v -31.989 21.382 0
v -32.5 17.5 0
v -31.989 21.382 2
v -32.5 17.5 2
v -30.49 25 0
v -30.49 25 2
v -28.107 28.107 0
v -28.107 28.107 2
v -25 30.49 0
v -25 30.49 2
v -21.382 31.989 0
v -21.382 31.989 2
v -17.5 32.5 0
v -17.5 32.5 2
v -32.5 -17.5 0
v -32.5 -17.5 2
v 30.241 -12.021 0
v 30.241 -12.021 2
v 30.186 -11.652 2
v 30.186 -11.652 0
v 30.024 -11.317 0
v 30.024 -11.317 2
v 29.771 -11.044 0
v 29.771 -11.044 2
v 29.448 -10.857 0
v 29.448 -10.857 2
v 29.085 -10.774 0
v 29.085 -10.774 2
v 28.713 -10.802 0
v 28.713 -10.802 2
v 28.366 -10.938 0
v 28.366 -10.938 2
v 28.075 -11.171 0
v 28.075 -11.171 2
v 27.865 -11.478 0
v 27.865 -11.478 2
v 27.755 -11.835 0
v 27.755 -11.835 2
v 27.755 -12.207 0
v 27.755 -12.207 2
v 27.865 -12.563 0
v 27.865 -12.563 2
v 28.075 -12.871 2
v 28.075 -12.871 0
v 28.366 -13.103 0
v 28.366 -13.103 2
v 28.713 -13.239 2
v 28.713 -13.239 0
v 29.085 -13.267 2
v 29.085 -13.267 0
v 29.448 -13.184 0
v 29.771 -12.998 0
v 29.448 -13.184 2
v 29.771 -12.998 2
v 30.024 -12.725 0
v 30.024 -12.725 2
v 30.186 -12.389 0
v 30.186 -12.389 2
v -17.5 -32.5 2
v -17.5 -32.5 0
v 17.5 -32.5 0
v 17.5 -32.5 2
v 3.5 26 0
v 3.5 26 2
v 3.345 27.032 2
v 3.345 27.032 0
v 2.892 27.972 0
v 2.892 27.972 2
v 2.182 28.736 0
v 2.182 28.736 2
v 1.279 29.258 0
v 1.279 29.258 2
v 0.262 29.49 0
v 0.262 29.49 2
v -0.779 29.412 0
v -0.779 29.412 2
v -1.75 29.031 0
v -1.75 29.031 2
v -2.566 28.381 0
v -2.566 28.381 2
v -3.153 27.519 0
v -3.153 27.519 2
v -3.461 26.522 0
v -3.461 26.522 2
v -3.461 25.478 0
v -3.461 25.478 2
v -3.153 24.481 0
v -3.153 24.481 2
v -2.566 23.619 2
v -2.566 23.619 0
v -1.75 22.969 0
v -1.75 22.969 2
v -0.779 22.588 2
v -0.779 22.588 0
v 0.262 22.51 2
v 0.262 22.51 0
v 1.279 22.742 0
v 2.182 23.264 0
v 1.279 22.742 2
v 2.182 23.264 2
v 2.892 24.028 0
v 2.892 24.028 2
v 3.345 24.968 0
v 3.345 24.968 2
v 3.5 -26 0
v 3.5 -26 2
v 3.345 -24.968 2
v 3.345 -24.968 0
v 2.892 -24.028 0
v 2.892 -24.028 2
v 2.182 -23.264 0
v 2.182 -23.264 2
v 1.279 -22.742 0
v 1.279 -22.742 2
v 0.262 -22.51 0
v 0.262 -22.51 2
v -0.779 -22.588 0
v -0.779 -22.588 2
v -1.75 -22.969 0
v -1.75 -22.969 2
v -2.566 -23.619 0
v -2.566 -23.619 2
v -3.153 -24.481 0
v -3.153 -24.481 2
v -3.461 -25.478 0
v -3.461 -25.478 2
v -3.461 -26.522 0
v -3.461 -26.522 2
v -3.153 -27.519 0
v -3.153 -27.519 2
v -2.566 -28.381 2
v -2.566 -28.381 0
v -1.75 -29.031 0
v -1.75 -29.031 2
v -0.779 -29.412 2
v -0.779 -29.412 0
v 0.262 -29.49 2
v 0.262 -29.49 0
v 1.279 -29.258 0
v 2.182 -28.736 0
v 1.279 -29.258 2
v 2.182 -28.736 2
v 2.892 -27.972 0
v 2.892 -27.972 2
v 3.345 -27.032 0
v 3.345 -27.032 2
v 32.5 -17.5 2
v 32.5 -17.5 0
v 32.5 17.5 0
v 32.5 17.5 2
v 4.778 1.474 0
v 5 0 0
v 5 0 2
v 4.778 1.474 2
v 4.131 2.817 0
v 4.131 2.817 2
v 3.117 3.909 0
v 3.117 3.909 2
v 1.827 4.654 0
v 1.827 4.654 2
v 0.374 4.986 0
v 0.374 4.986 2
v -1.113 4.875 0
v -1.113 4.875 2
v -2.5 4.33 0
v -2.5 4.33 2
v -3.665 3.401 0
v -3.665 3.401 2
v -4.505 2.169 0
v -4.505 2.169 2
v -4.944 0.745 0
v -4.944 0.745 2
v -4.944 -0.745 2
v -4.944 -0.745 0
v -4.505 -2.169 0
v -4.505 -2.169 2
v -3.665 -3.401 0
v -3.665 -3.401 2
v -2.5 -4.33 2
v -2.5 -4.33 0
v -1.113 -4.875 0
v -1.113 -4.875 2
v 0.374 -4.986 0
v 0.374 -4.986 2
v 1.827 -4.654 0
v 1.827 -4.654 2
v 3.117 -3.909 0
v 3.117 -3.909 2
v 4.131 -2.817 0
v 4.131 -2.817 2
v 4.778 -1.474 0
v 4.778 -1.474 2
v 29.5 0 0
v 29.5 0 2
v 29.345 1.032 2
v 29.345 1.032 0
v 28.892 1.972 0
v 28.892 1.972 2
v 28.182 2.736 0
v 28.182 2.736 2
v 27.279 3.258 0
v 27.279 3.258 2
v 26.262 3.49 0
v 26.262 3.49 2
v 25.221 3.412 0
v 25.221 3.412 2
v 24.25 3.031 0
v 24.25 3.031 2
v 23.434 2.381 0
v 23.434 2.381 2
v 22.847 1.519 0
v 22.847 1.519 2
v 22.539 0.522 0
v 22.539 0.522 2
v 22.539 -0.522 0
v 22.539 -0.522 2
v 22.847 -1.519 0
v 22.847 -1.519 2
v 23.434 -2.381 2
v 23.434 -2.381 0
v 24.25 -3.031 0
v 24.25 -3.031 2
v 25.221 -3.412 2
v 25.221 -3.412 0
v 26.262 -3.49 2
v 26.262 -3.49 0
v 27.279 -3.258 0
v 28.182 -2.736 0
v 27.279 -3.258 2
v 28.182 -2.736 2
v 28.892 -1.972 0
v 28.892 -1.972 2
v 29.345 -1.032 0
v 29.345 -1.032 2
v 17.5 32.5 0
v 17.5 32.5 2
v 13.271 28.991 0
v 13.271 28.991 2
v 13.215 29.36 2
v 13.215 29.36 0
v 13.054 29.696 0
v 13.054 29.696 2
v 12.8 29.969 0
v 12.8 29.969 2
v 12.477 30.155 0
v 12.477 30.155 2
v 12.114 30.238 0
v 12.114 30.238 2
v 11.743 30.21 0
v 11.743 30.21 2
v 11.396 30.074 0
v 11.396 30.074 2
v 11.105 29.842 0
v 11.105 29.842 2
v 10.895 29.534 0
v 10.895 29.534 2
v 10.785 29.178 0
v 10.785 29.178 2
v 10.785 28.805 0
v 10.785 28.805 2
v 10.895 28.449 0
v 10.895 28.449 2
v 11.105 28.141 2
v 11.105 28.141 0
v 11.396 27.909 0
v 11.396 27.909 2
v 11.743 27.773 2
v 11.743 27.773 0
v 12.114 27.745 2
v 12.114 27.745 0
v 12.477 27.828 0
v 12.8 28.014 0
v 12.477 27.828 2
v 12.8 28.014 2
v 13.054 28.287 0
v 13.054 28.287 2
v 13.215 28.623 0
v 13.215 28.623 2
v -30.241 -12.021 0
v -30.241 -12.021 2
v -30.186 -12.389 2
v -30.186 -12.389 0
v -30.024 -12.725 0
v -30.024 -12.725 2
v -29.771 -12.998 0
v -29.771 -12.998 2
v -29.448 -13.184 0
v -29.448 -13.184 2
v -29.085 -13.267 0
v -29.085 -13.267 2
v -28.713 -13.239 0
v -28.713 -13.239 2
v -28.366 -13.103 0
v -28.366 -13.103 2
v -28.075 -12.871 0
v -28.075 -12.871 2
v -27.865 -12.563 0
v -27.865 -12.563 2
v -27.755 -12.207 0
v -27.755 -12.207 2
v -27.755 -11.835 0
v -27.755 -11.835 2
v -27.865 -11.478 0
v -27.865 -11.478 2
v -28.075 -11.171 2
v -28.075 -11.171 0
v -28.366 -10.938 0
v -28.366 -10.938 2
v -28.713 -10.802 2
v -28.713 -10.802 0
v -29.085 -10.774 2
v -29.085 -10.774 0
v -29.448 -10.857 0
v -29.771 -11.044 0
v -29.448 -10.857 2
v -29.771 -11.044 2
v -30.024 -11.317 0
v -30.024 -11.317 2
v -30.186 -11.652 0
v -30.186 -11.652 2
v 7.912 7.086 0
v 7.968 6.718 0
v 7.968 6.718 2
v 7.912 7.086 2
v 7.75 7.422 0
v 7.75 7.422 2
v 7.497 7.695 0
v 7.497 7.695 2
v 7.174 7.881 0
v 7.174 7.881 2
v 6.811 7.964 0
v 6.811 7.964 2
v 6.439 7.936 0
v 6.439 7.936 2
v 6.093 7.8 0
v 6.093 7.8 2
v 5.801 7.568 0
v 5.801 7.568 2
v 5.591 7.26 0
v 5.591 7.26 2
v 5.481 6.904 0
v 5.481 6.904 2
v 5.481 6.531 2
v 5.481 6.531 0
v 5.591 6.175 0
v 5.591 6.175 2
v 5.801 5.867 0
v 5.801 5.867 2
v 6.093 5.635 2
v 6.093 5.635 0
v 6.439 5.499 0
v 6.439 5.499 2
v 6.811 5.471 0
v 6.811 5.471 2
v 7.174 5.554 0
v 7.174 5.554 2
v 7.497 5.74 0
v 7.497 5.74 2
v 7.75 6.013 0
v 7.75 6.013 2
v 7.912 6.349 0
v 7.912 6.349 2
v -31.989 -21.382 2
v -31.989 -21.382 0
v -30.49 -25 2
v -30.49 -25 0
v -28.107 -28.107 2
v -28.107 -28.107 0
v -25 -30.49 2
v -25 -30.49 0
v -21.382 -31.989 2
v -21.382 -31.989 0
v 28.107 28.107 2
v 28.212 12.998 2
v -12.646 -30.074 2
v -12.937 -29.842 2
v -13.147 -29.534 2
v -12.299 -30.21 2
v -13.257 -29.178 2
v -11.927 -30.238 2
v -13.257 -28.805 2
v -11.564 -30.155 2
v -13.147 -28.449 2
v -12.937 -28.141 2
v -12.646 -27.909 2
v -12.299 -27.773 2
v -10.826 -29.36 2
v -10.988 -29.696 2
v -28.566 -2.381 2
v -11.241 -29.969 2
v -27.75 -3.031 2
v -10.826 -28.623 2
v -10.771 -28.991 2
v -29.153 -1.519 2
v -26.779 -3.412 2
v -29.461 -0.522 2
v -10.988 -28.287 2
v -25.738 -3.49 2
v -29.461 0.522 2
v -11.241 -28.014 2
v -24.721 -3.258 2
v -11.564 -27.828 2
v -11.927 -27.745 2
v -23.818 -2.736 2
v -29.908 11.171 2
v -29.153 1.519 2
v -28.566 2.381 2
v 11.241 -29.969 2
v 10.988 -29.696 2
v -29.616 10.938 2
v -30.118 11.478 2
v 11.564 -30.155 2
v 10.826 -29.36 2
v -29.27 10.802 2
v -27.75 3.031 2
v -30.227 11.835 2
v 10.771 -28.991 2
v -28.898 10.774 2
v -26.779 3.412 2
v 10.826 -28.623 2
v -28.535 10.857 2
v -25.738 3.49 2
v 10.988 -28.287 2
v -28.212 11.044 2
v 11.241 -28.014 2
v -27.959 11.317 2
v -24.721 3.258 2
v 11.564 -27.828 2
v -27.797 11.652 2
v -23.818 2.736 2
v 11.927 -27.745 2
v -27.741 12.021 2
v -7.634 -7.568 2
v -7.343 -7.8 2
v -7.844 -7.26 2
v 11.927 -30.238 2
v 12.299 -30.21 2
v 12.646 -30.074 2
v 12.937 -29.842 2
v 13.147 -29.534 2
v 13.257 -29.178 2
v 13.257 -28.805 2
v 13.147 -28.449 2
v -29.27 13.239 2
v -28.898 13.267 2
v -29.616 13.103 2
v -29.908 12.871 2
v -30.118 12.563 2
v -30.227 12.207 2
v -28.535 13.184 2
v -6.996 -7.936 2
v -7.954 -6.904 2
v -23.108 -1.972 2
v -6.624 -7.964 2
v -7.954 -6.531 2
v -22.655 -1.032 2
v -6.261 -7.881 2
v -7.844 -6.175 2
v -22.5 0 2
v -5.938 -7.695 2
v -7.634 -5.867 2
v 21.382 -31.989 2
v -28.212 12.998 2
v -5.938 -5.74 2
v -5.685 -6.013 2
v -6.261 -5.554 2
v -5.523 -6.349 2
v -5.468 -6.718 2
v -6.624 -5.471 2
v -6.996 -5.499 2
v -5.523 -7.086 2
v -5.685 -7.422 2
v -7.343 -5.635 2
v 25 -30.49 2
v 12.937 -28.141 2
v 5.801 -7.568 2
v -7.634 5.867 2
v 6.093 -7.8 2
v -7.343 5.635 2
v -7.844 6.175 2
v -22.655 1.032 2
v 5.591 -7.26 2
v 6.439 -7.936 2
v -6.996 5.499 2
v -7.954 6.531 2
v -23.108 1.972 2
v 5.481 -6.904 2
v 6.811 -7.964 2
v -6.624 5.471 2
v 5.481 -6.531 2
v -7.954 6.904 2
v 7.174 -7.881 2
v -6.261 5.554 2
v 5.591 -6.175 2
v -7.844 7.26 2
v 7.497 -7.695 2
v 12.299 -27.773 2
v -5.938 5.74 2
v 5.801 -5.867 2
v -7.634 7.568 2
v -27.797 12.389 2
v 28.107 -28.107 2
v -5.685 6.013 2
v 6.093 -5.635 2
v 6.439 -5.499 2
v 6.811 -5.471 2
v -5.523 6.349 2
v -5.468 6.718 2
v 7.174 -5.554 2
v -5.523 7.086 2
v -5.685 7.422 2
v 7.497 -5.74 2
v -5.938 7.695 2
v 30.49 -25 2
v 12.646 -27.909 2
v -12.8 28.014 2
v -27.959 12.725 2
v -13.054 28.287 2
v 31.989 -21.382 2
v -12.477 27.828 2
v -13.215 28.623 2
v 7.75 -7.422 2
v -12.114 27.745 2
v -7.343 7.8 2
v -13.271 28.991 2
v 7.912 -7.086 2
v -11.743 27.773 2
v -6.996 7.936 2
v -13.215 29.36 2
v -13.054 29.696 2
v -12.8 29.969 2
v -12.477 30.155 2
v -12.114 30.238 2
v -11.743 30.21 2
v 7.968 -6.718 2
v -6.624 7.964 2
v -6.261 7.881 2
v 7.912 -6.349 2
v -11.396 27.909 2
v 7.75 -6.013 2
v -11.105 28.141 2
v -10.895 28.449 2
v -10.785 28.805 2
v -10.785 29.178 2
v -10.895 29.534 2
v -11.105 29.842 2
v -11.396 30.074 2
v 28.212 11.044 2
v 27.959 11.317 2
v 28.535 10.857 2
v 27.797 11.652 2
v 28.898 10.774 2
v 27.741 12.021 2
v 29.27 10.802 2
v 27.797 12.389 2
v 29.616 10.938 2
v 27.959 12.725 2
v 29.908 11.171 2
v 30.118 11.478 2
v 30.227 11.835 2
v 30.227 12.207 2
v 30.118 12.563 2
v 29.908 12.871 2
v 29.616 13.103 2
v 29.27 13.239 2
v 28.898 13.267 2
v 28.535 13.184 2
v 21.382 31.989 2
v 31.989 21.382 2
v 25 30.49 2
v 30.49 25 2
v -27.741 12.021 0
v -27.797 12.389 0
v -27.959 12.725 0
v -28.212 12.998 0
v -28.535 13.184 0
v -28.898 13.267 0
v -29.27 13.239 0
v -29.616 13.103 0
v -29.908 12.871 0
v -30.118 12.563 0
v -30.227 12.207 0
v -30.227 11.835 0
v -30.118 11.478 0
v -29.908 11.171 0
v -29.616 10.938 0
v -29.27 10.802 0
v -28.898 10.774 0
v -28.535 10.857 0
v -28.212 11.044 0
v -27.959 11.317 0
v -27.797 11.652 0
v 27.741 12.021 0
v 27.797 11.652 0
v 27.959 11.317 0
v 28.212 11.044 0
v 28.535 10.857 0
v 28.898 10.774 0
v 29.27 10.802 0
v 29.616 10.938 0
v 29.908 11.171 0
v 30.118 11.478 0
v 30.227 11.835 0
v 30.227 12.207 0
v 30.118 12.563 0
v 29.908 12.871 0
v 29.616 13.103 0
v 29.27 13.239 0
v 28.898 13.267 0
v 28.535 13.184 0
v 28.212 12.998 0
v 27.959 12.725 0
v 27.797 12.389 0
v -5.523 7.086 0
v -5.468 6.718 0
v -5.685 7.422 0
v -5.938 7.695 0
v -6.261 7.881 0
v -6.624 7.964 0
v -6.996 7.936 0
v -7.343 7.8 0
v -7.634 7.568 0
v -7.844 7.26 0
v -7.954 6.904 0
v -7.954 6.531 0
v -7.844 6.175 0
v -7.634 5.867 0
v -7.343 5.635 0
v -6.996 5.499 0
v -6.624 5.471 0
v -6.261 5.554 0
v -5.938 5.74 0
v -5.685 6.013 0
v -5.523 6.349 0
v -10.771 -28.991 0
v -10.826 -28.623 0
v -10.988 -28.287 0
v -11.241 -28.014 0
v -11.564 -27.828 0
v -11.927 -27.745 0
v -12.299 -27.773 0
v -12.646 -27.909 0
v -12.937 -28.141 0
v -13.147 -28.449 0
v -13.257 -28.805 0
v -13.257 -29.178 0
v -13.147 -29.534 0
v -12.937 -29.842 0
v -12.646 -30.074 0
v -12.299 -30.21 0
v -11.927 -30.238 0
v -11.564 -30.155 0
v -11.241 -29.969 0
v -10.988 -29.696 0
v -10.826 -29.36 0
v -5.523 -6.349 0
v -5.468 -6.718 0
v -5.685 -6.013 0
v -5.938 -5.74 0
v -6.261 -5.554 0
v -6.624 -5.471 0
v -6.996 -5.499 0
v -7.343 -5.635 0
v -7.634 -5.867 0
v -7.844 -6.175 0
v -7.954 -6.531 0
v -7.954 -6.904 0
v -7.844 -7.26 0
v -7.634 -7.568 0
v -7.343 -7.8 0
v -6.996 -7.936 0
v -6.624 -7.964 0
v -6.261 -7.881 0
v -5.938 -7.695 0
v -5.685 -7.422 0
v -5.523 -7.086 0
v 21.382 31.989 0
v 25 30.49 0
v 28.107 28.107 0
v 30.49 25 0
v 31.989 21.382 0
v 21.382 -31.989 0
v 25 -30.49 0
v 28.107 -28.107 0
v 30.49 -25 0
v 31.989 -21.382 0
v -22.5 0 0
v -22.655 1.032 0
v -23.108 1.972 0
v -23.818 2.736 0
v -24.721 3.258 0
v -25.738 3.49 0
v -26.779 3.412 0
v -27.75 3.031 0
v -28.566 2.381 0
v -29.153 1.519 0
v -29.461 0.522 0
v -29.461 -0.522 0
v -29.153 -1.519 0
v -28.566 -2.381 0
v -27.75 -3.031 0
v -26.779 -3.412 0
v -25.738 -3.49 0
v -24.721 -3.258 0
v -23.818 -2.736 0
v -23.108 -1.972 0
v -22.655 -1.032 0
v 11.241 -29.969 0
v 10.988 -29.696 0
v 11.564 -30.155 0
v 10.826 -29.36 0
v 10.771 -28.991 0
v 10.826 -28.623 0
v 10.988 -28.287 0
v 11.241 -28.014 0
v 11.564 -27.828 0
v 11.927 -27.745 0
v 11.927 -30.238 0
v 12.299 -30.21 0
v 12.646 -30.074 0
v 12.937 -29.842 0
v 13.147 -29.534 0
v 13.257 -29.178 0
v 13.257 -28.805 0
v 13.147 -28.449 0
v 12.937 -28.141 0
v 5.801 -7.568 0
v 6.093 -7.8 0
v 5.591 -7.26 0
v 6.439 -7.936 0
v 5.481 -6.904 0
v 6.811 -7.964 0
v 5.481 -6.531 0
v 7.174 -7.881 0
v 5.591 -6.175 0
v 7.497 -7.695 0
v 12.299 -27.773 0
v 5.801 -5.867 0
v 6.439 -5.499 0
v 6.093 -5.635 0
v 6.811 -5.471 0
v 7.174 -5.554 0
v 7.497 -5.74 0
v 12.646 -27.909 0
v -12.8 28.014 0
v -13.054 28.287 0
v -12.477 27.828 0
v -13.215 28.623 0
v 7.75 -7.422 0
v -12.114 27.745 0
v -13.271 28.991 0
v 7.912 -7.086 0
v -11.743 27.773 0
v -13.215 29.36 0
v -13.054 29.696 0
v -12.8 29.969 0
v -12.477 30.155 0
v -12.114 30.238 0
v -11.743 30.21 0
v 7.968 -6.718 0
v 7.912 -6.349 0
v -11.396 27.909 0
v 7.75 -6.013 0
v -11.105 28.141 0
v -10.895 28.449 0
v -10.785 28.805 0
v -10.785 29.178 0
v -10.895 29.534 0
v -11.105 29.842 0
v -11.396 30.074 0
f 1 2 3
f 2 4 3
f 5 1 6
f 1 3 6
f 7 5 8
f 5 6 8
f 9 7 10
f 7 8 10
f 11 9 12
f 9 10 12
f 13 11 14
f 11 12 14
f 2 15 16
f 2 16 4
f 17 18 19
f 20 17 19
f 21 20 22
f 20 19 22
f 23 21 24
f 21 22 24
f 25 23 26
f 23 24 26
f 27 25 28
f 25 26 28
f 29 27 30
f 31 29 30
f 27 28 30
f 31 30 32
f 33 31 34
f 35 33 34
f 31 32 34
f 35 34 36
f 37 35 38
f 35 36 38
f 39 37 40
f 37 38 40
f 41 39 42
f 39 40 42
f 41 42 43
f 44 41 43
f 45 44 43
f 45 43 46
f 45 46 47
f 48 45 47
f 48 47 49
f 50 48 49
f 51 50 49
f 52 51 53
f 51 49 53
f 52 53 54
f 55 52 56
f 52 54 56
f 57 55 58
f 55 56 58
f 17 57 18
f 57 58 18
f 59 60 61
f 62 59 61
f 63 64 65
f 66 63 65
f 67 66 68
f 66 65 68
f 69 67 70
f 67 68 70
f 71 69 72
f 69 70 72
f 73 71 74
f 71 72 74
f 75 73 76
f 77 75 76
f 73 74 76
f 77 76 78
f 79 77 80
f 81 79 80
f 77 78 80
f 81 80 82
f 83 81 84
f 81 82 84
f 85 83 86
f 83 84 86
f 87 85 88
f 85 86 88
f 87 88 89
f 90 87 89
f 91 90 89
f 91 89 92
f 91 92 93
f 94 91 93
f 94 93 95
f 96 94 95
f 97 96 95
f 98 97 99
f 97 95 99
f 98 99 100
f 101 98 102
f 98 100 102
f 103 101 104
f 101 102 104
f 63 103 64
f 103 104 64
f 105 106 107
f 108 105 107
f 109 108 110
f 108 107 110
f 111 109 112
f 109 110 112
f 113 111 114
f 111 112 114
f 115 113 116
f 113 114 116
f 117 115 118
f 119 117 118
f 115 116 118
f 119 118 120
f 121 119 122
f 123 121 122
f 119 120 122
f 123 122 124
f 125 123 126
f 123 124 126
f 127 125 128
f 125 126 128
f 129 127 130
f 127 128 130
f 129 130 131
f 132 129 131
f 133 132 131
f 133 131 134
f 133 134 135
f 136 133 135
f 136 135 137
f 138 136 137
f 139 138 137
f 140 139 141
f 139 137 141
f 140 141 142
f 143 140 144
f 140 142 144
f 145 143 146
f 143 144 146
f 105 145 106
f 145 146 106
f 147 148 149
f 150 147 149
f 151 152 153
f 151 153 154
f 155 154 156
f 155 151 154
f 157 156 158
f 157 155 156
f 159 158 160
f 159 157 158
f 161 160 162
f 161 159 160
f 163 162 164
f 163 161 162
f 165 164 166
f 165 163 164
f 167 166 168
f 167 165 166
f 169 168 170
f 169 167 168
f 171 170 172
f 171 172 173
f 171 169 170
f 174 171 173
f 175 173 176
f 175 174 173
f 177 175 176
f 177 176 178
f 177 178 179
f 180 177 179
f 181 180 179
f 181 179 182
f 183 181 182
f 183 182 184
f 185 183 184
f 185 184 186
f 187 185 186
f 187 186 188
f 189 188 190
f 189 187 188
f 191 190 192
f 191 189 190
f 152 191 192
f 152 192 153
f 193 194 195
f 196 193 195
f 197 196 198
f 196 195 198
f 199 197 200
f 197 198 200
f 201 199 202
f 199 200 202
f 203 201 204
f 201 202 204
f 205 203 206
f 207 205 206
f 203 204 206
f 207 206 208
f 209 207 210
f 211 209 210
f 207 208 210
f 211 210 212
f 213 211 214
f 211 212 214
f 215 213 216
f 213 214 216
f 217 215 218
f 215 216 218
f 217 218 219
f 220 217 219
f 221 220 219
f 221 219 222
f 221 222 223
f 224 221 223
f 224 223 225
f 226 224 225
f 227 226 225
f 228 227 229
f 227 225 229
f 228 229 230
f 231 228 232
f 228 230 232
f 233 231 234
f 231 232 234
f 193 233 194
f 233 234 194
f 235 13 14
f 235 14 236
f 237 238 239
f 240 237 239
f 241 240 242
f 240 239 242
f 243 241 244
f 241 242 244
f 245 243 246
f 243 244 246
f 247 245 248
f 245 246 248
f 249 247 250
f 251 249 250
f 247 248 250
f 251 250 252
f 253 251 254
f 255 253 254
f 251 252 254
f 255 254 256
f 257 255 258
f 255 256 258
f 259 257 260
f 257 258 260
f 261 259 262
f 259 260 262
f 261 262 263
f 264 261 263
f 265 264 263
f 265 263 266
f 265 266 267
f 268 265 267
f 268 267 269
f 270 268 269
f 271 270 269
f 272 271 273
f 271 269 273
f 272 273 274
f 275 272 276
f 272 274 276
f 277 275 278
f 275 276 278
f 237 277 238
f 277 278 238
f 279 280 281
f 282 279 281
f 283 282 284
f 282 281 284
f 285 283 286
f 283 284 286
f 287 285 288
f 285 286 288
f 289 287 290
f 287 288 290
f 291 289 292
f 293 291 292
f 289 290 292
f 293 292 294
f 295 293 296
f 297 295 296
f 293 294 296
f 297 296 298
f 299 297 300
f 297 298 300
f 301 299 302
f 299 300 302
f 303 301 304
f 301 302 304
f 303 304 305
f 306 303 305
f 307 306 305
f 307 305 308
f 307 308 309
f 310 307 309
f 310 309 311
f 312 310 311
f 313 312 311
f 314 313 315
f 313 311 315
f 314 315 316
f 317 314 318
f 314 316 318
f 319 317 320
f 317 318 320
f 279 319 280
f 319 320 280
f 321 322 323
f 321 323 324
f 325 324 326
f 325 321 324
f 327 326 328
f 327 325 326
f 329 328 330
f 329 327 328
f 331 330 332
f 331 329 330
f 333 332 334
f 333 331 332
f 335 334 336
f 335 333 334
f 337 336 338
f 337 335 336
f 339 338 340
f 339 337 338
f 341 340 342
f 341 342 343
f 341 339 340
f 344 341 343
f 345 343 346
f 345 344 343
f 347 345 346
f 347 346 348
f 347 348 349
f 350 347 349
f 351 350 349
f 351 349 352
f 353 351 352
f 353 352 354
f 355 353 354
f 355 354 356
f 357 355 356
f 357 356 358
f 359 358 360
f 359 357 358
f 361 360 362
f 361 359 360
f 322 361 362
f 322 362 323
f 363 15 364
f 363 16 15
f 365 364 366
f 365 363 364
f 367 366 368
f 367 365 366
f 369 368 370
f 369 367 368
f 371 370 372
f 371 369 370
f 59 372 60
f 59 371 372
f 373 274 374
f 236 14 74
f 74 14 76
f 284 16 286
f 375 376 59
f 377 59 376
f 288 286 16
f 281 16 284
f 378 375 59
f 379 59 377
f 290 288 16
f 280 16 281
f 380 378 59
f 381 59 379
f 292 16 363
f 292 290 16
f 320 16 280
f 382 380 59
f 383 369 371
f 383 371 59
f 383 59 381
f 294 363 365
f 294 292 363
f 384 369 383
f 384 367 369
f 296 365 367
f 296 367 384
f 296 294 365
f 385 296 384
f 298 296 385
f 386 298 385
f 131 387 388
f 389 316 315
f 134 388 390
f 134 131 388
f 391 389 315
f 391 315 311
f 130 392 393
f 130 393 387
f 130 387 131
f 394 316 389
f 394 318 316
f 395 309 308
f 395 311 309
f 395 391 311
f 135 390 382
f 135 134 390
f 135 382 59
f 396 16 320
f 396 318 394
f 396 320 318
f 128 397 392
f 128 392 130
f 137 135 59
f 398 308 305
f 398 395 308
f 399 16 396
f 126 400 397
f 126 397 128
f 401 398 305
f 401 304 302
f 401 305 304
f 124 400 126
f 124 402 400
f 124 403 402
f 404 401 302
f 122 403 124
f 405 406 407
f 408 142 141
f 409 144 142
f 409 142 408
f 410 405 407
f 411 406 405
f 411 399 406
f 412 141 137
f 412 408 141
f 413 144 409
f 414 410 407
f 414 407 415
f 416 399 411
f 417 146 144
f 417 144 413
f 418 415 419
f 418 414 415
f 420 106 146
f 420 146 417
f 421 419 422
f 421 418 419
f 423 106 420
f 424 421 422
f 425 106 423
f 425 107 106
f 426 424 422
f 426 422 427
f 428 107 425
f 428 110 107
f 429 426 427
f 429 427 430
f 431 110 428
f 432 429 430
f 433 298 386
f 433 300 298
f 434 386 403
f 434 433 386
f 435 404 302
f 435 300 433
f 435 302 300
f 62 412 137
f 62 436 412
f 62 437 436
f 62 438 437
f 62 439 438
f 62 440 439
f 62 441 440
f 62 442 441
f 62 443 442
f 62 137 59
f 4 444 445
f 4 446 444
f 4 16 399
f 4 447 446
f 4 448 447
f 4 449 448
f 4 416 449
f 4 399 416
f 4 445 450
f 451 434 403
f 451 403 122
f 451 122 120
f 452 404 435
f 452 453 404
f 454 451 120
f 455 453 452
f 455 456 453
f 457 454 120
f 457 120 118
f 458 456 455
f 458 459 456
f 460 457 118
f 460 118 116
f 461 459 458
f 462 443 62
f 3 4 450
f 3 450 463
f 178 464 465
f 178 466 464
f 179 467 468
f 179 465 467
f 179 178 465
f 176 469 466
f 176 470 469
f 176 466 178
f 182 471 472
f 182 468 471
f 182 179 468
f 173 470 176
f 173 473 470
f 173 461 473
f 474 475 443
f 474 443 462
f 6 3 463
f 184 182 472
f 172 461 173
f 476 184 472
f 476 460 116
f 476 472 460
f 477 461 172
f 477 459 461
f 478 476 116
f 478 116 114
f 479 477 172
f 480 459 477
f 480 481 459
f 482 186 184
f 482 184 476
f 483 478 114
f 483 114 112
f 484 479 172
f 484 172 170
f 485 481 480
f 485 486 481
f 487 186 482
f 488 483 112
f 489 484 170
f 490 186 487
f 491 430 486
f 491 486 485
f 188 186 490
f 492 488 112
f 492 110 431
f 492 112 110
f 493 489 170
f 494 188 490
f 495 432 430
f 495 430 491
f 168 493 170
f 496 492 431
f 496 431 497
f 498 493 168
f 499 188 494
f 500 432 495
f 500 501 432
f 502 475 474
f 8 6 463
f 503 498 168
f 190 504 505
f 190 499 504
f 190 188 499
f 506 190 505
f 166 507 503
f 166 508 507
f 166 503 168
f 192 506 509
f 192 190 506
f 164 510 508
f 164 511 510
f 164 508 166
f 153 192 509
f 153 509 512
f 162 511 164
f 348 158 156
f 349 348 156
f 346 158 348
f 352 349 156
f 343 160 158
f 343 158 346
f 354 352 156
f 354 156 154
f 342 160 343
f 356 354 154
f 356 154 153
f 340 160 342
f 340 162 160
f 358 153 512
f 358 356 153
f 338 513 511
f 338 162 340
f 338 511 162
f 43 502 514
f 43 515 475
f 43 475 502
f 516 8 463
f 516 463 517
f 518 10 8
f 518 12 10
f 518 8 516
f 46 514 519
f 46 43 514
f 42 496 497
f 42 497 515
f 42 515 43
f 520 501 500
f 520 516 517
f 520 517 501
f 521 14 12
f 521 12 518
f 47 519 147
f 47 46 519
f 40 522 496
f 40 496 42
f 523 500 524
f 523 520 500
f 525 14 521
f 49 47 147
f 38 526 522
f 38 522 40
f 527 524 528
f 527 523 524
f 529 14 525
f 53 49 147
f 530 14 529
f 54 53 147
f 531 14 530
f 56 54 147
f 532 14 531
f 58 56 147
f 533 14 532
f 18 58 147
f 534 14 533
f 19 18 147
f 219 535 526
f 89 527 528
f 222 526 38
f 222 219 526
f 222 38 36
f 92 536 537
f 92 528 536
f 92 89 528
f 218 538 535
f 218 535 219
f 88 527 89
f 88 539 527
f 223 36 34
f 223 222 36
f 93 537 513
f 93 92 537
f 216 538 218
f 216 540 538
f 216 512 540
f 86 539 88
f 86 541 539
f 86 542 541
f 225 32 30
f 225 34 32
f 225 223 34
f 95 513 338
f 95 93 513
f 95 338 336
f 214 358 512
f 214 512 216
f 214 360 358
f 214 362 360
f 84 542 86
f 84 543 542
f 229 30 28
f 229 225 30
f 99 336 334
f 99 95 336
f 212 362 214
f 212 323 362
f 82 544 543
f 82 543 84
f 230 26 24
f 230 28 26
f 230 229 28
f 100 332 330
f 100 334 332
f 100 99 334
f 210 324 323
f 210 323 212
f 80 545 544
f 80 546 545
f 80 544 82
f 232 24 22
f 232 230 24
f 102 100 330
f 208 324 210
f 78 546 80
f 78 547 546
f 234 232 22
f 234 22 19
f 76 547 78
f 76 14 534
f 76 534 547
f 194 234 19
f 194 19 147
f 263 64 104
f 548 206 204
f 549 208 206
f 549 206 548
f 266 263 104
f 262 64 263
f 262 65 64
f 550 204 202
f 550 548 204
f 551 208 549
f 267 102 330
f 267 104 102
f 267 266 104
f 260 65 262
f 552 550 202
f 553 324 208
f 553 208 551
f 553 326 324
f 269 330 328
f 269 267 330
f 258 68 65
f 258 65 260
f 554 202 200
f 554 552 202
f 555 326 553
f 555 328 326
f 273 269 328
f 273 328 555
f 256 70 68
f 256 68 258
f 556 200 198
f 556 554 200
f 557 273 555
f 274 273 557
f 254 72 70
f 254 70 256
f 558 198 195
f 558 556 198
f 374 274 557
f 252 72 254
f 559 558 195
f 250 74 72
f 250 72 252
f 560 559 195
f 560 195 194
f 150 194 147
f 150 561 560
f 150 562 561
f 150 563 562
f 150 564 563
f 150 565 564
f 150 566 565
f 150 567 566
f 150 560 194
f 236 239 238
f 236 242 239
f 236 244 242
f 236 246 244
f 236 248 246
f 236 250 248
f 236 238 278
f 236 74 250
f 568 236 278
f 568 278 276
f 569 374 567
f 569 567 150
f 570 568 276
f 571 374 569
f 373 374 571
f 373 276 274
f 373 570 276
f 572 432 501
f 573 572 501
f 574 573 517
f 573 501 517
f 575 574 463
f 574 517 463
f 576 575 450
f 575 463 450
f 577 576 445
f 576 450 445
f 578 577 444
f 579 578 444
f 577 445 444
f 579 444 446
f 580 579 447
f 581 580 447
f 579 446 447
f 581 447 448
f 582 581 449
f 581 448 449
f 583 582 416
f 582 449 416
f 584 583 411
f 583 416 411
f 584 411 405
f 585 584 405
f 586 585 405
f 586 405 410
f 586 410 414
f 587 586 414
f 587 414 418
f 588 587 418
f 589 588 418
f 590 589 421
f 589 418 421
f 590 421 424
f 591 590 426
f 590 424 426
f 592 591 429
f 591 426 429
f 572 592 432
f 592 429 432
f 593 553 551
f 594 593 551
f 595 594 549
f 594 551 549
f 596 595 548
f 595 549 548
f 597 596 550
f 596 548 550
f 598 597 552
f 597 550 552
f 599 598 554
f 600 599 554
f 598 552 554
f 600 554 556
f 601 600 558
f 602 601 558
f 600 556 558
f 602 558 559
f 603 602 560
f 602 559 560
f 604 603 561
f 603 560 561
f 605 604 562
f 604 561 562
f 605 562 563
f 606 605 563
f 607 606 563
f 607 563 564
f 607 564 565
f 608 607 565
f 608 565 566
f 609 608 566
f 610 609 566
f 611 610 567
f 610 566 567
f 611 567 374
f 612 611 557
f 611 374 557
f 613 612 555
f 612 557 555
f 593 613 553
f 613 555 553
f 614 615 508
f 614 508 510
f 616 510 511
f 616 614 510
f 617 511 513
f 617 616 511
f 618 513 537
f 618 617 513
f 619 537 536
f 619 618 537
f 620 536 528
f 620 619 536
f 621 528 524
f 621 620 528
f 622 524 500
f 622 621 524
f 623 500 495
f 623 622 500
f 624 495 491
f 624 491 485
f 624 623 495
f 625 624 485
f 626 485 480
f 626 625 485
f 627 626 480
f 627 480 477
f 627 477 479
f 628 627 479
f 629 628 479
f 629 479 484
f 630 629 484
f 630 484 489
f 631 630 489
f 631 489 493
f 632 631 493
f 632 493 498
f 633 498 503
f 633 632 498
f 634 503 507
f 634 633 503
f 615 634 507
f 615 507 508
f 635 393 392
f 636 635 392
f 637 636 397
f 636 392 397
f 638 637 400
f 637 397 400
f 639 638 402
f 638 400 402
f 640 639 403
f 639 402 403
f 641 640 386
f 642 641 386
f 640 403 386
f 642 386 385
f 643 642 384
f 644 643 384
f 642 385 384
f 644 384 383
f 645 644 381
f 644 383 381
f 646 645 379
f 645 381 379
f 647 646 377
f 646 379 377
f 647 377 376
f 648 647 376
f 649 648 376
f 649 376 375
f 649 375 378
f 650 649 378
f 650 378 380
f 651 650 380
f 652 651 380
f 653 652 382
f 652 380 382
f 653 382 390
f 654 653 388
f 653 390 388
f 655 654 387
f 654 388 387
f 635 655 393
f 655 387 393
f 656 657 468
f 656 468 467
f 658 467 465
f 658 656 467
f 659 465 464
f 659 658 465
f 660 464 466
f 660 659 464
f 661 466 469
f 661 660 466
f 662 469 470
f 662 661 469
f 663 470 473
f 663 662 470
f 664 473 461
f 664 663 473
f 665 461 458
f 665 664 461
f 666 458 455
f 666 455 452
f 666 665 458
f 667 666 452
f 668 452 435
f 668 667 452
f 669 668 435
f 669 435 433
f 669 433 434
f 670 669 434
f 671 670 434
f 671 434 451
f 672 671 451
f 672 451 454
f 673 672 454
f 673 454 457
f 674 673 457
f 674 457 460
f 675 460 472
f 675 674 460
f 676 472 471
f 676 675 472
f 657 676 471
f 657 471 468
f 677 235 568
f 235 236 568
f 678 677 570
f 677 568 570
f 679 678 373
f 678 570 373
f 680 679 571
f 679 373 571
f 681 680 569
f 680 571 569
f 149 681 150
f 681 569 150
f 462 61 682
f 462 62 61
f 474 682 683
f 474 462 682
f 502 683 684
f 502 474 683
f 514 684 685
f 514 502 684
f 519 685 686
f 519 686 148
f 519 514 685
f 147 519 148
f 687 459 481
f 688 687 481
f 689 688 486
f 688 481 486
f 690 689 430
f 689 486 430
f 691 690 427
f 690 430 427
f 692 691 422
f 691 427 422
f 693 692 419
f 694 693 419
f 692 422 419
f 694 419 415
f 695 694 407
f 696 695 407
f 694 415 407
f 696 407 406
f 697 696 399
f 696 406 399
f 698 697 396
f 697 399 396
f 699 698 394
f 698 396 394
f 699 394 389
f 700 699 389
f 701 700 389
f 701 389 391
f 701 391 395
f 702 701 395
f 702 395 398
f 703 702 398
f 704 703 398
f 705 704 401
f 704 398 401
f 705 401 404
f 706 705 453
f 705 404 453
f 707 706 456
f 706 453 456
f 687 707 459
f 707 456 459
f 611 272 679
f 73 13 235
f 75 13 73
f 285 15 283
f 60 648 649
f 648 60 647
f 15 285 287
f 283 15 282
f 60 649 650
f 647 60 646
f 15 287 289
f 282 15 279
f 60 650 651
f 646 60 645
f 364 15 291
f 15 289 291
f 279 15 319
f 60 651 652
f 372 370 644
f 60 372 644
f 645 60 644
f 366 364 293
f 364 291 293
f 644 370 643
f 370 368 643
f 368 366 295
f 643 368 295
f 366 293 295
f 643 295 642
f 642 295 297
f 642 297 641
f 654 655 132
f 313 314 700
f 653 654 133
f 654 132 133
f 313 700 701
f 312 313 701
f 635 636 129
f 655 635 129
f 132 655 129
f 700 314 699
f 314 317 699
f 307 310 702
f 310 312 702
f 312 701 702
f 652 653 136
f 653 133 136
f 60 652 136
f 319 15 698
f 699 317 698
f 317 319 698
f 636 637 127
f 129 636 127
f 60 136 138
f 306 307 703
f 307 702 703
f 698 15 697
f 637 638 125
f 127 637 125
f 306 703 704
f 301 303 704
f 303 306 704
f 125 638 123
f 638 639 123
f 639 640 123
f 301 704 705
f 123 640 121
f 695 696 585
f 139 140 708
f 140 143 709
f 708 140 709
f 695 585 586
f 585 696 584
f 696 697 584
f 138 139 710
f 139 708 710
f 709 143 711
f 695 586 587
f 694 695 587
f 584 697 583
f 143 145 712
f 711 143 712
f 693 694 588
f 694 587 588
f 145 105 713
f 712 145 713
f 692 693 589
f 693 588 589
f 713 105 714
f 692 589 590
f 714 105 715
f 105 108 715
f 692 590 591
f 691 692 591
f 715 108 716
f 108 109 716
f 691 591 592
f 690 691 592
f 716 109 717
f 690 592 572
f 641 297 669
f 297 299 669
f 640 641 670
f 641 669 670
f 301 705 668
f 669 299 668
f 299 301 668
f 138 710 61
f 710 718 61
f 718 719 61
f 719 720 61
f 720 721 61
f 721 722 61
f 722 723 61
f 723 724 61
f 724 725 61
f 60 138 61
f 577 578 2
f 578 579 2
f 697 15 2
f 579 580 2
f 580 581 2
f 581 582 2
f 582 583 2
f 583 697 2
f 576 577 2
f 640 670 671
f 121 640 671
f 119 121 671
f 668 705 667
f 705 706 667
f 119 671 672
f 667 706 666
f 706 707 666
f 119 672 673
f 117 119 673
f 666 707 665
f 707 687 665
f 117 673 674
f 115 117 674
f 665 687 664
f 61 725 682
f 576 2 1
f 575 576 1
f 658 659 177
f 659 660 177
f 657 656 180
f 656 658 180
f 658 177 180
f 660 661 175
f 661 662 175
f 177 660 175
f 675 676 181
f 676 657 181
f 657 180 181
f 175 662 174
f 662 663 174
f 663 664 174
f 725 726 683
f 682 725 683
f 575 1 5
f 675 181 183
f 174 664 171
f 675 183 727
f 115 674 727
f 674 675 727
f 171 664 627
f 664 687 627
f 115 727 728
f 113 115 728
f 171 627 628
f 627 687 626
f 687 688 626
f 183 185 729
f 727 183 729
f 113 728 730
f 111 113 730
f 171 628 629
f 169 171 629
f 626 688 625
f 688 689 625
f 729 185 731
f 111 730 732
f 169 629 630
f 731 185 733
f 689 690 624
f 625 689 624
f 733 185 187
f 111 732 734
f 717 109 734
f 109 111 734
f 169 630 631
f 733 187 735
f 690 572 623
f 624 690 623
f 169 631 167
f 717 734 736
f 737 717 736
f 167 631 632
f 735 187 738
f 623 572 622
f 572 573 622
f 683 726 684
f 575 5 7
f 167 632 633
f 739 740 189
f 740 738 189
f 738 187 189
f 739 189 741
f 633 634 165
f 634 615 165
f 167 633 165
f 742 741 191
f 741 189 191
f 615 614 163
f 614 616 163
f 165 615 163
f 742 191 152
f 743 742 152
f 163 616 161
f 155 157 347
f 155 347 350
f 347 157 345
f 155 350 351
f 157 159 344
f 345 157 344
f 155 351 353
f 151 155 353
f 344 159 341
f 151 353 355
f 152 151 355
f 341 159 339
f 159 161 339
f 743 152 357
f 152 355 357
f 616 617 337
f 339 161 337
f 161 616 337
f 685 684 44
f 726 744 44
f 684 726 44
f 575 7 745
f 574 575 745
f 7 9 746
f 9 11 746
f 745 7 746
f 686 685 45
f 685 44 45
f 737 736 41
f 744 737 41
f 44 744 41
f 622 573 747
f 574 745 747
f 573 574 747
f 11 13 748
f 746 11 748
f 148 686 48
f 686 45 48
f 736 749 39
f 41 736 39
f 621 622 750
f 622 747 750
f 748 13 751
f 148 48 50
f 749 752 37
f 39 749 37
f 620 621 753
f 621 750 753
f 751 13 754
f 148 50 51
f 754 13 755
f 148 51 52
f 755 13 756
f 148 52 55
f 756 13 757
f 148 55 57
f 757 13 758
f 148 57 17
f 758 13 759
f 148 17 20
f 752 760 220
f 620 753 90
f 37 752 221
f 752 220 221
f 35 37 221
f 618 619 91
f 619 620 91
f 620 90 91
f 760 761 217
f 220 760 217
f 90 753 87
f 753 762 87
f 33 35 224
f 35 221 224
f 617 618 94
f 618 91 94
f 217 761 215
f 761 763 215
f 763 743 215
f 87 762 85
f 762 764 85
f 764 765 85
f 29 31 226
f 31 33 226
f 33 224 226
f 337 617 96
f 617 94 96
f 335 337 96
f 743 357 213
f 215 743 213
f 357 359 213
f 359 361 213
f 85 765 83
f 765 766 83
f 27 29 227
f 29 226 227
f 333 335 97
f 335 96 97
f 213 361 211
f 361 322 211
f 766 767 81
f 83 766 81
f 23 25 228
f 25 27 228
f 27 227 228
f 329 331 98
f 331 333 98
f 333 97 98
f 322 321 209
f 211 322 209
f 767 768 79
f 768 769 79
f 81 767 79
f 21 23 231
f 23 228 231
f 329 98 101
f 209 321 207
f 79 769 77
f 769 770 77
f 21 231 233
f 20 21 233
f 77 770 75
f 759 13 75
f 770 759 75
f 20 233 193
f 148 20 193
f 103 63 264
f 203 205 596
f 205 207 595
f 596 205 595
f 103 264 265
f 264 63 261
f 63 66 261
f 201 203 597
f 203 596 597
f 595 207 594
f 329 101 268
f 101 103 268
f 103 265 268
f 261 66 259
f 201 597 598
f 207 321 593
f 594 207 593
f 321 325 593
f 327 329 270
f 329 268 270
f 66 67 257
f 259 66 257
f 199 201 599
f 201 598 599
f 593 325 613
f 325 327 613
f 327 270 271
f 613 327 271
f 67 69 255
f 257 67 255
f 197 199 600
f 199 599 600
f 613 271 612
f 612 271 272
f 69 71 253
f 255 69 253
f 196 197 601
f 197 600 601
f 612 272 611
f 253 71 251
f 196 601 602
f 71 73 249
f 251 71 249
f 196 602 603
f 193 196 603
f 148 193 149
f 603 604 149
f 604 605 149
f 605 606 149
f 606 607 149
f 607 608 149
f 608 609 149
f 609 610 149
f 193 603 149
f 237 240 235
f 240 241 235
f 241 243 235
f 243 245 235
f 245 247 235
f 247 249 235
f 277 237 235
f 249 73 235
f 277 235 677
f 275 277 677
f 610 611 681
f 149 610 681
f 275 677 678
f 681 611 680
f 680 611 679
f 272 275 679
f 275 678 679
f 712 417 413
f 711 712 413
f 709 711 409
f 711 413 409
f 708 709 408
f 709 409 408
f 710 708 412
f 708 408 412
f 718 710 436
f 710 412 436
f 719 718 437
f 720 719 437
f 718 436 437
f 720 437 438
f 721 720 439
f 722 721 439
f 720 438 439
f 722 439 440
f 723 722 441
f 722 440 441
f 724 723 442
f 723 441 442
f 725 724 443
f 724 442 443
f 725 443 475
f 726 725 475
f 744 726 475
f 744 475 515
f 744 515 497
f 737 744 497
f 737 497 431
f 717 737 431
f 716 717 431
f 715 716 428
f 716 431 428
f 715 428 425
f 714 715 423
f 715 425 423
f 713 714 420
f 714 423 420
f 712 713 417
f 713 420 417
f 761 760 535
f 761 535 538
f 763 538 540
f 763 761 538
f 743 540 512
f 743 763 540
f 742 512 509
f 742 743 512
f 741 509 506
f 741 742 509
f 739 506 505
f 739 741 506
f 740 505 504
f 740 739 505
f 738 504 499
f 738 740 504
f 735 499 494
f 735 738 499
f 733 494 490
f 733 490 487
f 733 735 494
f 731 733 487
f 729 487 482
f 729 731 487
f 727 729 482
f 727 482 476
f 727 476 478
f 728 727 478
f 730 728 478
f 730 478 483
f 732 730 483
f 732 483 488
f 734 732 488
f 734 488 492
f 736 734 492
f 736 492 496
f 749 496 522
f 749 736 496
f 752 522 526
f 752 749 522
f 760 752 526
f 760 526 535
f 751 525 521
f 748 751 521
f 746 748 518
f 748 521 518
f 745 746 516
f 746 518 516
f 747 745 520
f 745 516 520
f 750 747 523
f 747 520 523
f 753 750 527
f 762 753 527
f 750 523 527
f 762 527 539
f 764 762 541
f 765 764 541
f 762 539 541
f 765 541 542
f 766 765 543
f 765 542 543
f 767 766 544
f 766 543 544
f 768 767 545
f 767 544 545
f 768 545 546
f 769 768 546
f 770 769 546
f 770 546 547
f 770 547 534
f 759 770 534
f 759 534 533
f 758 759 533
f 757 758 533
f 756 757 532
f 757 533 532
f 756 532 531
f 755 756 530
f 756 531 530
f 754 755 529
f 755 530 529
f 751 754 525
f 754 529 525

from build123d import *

# Parameters (mm, degrees)
CROQUIS1_W              = 65
CROQUIS1_H              = 65
CROQUIS1_R              = 5
CROQUIS1_R_2            = 1.25
SALIENTE_EXTRUIR1_DEPTH = 2
REDONDEO1_R             = 15
CROQUIS2_R              = 3.5
CORTAR_EXTRUIR1_DEPTH   = 2
CROQUIS3_R              = 1.25
CORTAR_EXTRUIR2_DEPTH   = 2


with BuildPart() as part:
    # Croquis1 → Saliente-Extruir1 (new body)
    with BuildSketch(Plane.XY):
        Rectangle(CROQUIS1_W, CROQUIS1_H)
        Circle(CROQUIS1_R, mode=Mode.SUBTRACT)
        with Locations((-6.717514421, 6.717514421)):
            Circle(CROQUIS1_R_2, mode=Mode.SUBTRACT)
        with Locations((6.717514421, 6.717514421)):
            Circle(CROQUIS1_R_2, mode=Mode.SUBTRACT)
        with Locations((6.717514421, -6.717514421)):
            Circle(CROQUIS1_R_2, mode=Mode.SUBTRACT)
        with Locations((-6.717514421, -6.717514421)):
            Circle(CROQUIS1_R_2, mode=Mode.SUBTRACT)
    extrude(amount=SALIENTE_EXTRUIR1_DEPTH)

    # Redondeo1
    redondeo1_edges = [part.edges().sort_by_distance(p)[0] for p in [
        (32.5, -32.5, 1),
        (-32.5, -32.5, 1),
        (-32.5, 32.5, 1),
        (32.5, 32.5, 1),
    ]]
    fillet(redondeo1_edges, radius=REDONDEO1_R)

    # Croquis2 → Cortar-Extruir1 (cut)
    with BuildSketch(Plane.XY.offset(2)):
        with Locations((-26, 0)):
            Circle(CROQUIS2_R)
        with Locations((0, 26)):
            Circle(CROQUIS2_R)
        with Locations((26, 0)):
            Circle(CROQUIS2_R)
        with Locations((0, -26)):
            Circle(CROQUIS2_R)
    extrude(amount=-CORTAR_EXTRUIR1_DEPTH, mode=Mode.SUBTRACT)

    # Croquis3 → Cortar-Extruir2 (cut)
    with BuildSketch(Plane.XY.offset(2)):
        with Locations((-28.991378029, 12.02081528)):
            Circle(CROQUIS3_R)
        with Locations(Location((-12.02081528, 28.991378029, 0), (0, 0, 180))):
            Circle(CROQUIS3_R)
        with Locations((12.02081528, 28.991378029)):
            Circle(CROQUIS3_R)
        with Locations(Location((28.991378029, 12.02081528, 0), (0, 0, 180))):
            Circle(CROQUIS3_R)
        with Locations((28.991378029, -12.02081528)):
            Circle(CROQUIS3_R)
        with Locations(Location((12.02081528, -28.991378029, 0), (0, 0, 180))):
            Circle(CROQUIS3_R)
        with Locations((-12.02081528, -28.991378029)):
            Circle(CROQUIS3_R)
        with Locations(Location((-28.991378029, -12.02081528, 0), (0, 0, 180))):
            Circle(CROQUIS3_R)
    extrude(amount=-CORTAR_EXTRUIR2_DEPTH, mode=Mode.SUBTRACT)


solid = part.part
